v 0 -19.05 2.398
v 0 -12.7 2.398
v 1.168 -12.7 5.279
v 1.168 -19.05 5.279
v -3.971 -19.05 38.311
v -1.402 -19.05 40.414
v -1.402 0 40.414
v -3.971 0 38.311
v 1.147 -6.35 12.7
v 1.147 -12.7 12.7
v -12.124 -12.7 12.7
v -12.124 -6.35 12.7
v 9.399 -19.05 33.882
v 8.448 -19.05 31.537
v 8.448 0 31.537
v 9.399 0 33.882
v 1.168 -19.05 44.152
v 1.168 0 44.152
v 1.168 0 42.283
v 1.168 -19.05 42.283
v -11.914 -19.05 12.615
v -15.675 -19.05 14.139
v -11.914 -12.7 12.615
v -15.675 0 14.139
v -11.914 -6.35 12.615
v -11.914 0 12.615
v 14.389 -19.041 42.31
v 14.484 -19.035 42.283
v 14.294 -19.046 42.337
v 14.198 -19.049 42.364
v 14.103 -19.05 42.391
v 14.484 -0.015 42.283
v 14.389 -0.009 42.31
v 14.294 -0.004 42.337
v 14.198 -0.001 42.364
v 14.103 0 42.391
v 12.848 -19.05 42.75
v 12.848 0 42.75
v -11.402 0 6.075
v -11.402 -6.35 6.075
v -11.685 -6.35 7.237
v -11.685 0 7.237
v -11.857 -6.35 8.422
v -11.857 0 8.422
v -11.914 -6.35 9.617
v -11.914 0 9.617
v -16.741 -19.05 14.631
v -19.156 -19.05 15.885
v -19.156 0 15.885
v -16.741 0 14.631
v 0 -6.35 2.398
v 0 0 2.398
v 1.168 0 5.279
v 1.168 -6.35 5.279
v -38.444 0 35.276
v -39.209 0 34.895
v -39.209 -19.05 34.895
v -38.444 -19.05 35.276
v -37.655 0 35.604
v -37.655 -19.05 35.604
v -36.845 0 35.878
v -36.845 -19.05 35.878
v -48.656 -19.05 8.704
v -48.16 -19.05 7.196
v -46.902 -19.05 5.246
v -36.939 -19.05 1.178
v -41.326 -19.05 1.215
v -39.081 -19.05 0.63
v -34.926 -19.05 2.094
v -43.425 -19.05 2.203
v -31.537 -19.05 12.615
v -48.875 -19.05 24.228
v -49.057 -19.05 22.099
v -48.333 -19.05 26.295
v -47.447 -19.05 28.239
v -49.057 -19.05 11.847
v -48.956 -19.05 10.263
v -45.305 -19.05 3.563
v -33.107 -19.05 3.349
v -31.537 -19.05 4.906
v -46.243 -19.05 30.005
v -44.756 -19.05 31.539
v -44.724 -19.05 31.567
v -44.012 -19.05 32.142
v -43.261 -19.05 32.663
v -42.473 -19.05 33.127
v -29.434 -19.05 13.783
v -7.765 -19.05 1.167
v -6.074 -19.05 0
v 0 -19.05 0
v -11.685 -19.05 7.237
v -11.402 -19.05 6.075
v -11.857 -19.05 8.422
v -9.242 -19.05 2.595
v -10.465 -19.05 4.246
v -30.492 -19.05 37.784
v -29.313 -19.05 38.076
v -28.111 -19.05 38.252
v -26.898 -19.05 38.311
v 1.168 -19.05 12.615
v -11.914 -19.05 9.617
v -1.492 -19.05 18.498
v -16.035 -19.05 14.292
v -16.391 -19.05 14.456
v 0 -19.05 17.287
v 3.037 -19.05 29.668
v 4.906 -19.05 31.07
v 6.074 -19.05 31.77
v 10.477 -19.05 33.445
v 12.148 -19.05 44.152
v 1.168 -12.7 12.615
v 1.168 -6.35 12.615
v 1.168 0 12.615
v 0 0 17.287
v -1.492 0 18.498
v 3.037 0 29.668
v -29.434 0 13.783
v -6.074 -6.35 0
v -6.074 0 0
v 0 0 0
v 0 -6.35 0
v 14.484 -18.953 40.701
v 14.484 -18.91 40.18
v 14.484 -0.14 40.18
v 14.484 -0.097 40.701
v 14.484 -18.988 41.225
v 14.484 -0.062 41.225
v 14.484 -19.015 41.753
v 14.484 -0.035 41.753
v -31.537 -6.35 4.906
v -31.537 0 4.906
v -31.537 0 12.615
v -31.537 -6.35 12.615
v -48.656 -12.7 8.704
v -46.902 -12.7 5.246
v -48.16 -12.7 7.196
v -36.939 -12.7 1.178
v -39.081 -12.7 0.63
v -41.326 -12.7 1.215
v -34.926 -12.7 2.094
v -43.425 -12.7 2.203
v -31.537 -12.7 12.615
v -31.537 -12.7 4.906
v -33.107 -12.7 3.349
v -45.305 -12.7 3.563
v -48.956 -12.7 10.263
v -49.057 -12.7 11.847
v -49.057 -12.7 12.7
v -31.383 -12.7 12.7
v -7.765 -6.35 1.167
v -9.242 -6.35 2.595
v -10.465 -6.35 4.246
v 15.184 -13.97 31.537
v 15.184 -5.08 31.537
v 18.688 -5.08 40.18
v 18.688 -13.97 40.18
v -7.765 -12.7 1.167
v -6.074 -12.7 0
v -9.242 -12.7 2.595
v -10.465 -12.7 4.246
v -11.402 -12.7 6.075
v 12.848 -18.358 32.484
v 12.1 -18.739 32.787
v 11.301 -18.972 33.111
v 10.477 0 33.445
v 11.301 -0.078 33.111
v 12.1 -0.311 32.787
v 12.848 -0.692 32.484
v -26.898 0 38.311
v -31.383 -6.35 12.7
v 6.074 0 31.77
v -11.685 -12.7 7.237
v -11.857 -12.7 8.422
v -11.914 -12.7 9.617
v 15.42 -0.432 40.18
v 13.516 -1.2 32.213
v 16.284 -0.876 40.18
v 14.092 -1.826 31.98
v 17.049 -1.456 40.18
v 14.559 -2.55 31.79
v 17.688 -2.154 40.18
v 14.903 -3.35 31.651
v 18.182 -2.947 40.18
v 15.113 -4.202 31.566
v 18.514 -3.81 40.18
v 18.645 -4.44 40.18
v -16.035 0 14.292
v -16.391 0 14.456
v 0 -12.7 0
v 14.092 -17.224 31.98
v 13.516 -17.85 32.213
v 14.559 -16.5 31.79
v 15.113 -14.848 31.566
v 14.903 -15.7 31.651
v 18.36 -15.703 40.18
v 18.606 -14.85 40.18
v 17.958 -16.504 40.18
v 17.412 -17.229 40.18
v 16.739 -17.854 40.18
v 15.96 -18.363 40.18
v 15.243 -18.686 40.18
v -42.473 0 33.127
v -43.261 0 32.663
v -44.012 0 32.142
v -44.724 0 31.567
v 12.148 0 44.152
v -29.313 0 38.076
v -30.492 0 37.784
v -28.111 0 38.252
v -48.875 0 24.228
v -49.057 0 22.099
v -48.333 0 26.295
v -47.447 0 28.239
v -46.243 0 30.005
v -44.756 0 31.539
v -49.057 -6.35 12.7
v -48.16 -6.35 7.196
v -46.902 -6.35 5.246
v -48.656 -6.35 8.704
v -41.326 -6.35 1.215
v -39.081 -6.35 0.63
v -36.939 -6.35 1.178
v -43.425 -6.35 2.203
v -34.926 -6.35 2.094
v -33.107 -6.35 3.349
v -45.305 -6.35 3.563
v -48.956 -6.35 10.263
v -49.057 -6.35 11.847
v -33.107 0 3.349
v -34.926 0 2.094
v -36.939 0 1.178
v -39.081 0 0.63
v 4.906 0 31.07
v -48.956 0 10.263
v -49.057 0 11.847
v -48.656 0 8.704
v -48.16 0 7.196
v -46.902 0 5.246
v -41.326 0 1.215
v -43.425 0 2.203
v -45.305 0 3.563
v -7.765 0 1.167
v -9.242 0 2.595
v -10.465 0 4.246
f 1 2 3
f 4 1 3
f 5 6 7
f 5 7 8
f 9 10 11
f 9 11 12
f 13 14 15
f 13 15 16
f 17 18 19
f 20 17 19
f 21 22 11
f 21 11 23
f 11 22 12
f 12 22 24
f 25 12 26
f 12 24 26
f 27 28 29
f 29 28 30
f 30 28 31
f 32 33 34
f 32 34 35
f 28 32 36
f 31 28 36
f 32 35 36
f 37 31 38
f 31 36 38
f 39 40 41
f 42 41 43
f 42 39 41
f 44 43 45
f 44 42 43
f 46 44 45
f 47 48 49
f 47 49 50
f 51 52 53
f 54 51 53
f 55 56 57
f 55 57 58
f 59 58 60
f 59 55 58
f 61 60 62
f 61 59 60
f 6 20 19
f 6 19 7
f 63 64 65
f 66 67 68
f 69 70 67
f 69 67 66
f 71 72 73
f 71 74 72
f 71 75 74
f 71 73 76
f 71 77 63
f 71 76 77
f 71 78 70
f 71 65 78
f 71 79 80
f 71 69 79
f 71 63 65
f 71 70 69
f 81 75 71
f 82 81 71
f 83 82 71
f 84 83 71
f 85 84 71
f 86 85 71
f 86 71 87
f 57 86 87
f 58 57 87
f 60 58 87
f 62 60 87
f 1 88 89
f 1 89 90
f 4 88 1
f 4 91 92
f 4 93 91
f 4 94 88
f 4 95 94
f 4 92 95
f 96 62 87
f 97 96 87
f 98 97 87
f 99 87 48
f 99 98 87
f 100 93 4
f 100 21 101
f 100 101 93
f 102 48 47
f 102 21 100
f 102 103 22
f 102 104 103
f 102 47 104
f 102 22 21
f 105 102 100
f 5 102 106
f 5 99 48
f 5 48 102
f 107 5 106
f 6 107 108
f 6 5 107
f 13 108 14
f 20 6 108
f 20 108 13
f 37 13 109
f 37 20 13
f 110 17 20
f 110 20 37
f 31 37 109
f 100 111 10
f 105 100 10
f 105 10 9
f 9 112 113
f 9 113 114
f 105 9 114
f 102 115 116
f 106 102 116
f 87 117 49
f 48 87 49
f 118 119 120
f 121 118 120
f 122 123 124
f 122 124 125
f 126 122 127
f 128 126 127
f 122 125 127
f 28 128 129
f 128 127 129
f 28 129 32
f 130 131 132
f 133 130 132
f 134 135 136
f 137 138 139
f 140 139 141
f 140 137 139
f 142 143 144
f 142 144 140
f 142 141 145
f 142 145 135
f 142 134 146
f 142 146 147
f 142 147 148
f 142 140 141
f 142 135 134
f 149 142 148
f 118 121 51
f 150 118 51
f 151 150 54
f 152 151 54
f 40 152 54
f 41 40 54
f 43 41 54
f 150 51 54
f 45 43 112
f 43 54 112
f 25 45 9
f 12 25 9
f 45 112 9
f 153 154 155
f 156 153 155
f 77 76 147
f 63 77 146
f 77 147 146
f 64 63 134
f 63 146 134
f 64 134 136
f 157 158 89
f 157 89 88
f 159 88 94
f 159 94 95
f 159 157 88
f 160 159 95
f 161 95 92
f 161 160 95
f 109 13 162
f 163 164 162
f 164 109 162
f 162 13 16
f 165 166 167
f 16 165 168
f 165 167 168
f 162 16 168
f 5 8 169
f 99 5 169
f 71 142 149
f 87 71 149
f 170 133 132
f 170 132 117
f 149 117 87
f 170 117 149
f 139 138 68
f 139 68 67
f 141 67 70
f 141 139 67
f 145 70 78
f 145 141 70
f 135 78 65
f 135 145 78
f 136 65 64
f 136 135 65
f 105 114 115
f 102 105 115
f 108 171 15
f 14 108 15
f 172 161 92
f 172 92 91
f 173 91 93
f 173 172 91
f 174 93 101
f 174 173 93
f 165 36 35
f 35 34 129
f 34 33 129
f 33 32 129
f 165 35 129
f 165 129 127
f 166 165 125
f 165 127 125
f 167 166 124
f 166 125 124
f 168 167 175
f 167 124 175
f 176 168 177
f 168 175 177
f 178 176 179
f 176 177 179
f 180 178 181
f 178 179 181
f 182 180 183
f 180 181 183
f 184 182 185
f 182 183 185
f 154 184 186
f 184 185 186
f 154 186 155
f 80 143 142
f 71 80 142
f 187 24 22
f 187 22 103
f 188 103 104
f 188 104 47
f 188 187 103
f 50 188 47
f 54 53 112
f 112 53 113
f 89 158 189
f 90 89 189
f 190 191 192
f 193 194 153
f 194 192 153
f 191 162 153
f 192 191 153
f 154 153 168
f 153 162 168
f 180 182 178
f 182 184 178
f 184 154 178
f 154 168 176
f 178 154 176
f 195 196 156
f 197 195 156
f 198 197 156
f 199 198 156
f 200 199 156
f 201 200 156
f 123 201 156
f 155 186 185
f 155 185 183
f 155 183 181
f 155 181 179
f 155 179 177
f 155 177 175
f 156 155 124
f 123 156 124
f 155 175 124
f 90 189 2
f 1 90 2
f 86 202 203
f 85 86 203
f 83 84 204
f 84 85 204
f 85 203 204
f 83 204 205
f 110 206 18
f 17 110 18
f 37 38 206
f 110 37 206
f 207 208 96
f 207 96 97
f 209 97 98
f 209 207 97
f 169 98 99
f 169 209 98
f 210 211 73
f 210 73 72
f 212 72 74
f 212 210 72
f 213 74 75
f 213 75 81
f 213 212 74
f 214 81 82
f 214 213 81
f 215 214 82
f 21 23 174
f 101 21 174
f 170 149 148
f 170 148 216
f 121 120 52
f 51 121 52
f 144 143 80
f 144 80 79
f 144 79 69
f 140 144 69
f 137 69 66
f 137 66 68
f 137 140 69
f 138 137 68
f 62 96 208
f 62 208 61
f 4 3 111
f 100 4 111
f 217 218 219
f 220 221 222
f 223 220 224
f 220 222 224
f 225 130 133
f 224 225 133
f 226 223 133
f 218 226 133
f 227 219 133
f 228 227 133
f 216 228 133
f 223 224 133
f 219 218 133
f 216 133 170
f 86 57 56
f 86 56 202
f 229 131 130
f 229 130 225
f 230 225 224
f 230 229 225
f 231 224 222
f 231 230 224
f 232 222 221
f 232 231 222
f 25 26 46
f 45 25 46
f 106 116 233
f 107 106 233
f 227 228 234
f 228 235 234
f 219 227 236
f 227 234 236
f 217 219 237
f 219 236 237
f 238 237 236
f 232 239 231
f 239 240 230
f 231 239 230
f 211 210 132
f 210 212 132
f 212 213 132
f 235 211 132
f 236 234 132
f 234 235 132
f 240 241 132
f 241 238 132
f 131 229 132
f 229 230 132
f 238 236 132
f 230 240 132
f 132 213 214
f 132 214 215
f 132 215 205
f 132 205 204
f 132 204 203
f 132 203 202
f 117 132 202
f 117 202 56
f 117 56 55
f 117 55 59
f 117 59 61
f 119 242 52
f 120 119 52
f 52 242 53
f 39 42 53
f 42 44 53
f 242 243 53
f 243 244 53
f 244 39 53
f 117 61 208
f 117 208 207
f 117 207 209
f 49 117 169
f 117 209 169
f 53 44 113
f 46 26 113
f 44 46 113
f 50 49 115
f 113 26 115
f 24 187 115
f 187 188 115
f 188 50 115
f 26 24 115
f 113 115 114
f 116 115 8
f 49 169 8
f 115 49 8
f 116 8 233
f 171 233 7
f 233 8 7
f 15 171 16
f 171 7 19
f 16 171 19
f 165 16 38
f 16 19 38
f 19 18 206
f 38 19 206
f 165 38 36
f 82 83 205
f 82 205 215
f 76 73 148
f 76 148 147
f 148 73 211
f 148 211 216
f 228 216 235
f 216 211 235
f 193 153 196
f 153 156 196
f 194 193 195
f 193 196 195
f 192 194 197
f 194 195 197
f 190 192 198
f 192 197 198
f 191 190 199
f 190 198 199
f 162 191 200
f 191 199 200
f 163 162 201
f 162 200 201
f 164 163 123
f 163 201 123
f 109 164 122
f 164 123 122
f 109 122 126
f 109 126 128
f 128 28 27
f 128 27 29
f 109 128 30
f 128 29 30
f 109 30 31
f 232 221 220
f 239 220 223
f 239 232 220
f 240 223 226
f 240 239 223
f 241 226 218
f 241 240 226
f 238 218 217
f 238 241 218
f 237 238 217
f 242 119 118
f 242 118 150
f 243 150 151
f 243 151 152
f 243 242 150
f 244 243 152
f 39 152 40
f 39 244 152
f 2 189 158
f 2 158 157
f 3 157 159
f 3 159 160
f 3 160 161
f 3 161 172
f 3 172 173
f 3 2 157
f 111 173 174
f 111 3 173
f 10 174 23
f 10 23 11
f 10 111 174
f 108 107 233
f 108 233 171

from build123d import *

# Parameters (mm, degrees)
F1_DEPTH     = 19.05
F2_T1_DEPTH  = 28.2300180496
F2_T3_DEPTH  = 25.482580603
F2_T5_DEPTH  = 25.9366089247
F2_T7_DEPTH  = 47.5485210799
F2_T9_DEPTH  = 32.7314977927
F2_T11_DEPTH = 59.1455336843
F2_T13_DEPTH = 52.8213628452
F2_T15_DEPTH = 21.9875710363
F2_T17_DEPTH = 46.4468482438
F2_T19_DEPTH = 29.758572197
F3_R         = 5.08
F5_W         = 6.35
F5_H         = 12.7
F6_DEPTH     = 303.0582275594


# Not quite as in the source:
# - a fillet or chamfer that OpenCascade refuses, or shapes differently, is made with other operations: its cross-section is extruded or revolved along the edge and cut away or added


with BuildPart() as f1:
    # F0 (on Front) → F1 (new body)
    with BuildSketch(Plane.XZ):
        Polygon((-45.0859302655, 0.4672128707), (-34.340060316, 0.4672128707), (-31.5367905423, 4.9057230353), (-31.5367905423, 9.1106286272), (-31.5367905423, 12.6147158444), (-29.4343372807, 13.7827442959), (-19.1556811333, 15.8851970918), (-16.2193404098, 14.3601642462), (-11.9138995651, 12.6147158444), (-11.9138995651, 9.1106286272), (-11.9138995651, 7.4753854424), (-9.811447002, 1.5152803213), (-6.0737542808, 0), (0, 0), (0, 2.3983575983), (1.1680293828, 5.2794977153), (1.1680293828, 9.1106286272), (1.1680293828, 12.6147158444), (0, 17.2868324444), (-1.4916199837, 18.4976548306), (3.0368734151, 29.6679423191), (4.9057211727, 31.0695767403), (6.0737496242, 31.770395115), (8.4476916948, 31.5367886797), (9.3986034807, 33.8823718767), (12.8483185545, 32.4838392109), (15.1843773201, 31.5367886797), (18.6884636059, 40.1802044362), (14.483560808, 40.1802044362), (14.483560808, 42.2826576978), (12.8483185545, 42.7498687059), (12.1475020424, 44.1515035927), (8.1762028858, 44.1515035927), (5.3729321808, 44.1515035927), (1.1680293828, 44.1515035927), (1.1680293828, 42.2826576978), (-1.4016367495, 40.4138118029), (-3.9712996222, 38.3113585413), (-14.7171695717, 38.3113585413), (-22.192556411, 38.3113585413), (-28.7335207686, 38.3113585413), (-38.0777539685, 35.5080878362), (-43.684293516, 32.4712125584), (-49.0572275594, 27.7990954928), (-49.0572275594, 14.9507736787), (-49.0572275594, 9.1106286272), align=None)
    extrude(amount=F1_DEPTH)

    # F2: fillet of radius 12.5094889948 on 10 edges, made by hand

    # F2_s2 → F2_t1 (cut)
    with BuildSketch(Plane.XZ.offset(-4.5900090248)):
        with BuildLine():
            ThreePointArc((-30.4920932473, 37.7837866574), (-28.7140598467, 38.1787628389), (-26.8975171587, 38.3113585413))
            Line((-26.8975171587, 38.3113585413), (-28.7335207686, 38.3113585413))
            Line((-28.7335207686, 38.3113585413), (-30.4920932473, 37.7837866574))
        make_face()
    extrude(amount=F2_T1_DEPTH, mode=Mode.SUBTRACT)

    # F2_s4 → F2_t3 (cut)
    with BuildSketch(Plane.XZ.offset(-3.2162903015)):
        with BuildLine():
            ThreePointArc((-39.2089772844, 34.8953419361), (-38.0524286269, 35.4471609705), (-36.8454950389, 35.8777656133))
            Line((-36.8454950389, 35.8777656133), (-38.0777539685, 35.5080878362))
            Line((-38.0777539685, 35.5080878362), (-39.2089772844, 34.8953419361))
        make_face()
    extrude(amount=F2_T3_DEPTH, mode=Mode.SUBTRACT)

    # F2_s6 → F2_t5 (cut)
    with BuildSketch(Plane.XZ.offset(-3.4433044624)):
        with BuildLine():
            ThreePointArc((-42.4732255071, 33.1272076629), (-43.6412308258, 32.4090824128), (-44.7236280922, 31.5674432638))
            Line((-44.7236280922, 31.5674432638), (-43.684293516, 32.4712125584))
            Line((-43.684293516, 32.4712125584), (-42.4732255071, 33.1272076629))
        make_face()
    extrude(amount=F2_T5_DEPTH, mode=Mode.SUBTRACT)

    # F2_s8 → F2_t7 (cut)
    with BuildSketch(Plane.XZ.offset(-14.2492605399)):
        with BuildLine():
            ThreePointArc((-49.0572275594, 22.0993912768), (-47.9313005389, 27.2860888474), (-44.7561994839, 31.5391203114))
            Line((-44.7561994839, 31.5391203114), (-49.0572275594, 27.7990954928))
            Line((-49.0572275594, 27.7990954928), (-49.0572275594, 22.0993912768))
        make_face()
    extrude(amount=F2_T7_DEPTH, mode=Mode.SUBTRACT)

    # F2_s10 → F2_t9 (cut)
    with BuildSketch(Plane.XZ.offset(-6.8407488963)):
        with BuildLine():
            ThreePointArc((-49.0572275594, 11.8469281858), (-48.7682894076, 9.1738303565), (-47.9148224607, 6.6242163797))
            Line((-47.9148224607, 6.6242163797), (-49.0572275594, 9.1106286272))
            Line((-49.0572275594, 9.1106286272), (-49.0572275594, 11.8469281858))
        make_face()
    extrude(amount=F2_T9_DEPTH, mode=Mode.SUBTRACT)

    # F2_s12 → F2_t11 (cut)
    with BuildSketch(Plane.XZ.offset(-20.0477668422)):
        with BuildLine():
            ThreePointArc((-37.0668235286, 0.4672128707), (-43.8178922977, 2.4453018928), (-48.4339074248, 7.7539900595))
            Line((-48.4339074248, 7.7539900595), (-45.0859302655, 0.4672128707))
            Line((-45.0859302655, 0.4672128707), (-37.0668235286, 0.4672128707))
        make_face()
    extrude(amount=F2_T11_DEPTH, mode=Mode.SUBTRACT)

    # F2_s14 → F2_t13 (cut)
    with BuildSketch(Plane.XZ.offset(-16.8856814226)):
        with BuildLine():
            ThreePointArc((-31.5367905423, 4.9057230353), (-35.825391148, 1.6309728064), (-41.0943328851, 0.4672128707))
            Line((-41.0943328851, 0.4672128707), (-34.340060316, 0.4672128707))
            Line((-34.340060316, 0.4672128707), (-31.5367905423, 4.9057230353))
        make_face()
    extrude(amount=F2_T13_DEPTH, mode=Mode.SUBTRACT)

    # F2_s16 → F2_t15 (cut)
    with BuildSketch(Plane.XZ.offset(-1.4687855182)):
        with BuildLine():
            ThreePointArc((-15.6748678973, 14.139432221), (-16.2135660804, 14.3726858024), (-16.7407283206, 14.6309549221))
            Line((-16.7407283206, 14.6309549221), (-16.2193404098, 14.3601642462))
            Line((-16.2193404098, 14.3601642462), (-15.6748678973, 14.139432221))
        make_face()
    extrude(amount=F2_T15_DEPTH, mode=Mode.SUBTRACT)

    # F2_s18 → F2_t17 (cut)
    with BuildSketch(Plane.XZ.offset(-13.6984241219)):
        with BuildLine():
            ThreePointArc((-6.0737542808, 0), (-9.4531651589, 2.8427255588), (-11.6342326331, 6.6825759671))
            Line((-11.6342326331, 6.6825759671), (-9.811447002, 1.5152803213))
            Line((-9.811447002, 1.5152803213), (-6.0737542808, 0))
        make_face()
    extrude(amount=F2_T17_DEPTH, mode=Mode.SUBTRACT)

    # F2_s20 → F2_t19 (cut)
    with BuildSketch(Plane.XZ.offset(-5.3542860985)):
        with BuildLine():
            ThreePointArc((-11.2014295993, 5.4556509826), (-11.7344956192, 7.5061006875), (-11.9138995651, 9.6170998818))
            Line((-11.9138995651, 9.6170998818), (-11.9138995651, 7.4753854424))
            Line((-11.9138995651, 7.4753854424), (-11.2014295993, 5.4556509826))
        make_face()
    extrude(amount=F2_T19_DEPTH, mode=Mode.SUBTRACT)

    # F3
    f3_edges = [f1.edges().sort_by_distance(p)[0] for p in [
        (16.93642, 0, 35.858497),
        (16.93642, -19.05, 35.858497),
    ]]
    fillet(f3_edges, radius=F3_R)

    # F5 (on offset) → F6 (cut, through all)
    with BuildSketch(Plane.YZ.offset(254)):
        with Locations((-9.525, 6.35)):
            Rectangle(F5_W, F5_H)
    extrude(amount=-F6_DEPTH, mode=Mode.SUBTRACT)


solid = f1.part
